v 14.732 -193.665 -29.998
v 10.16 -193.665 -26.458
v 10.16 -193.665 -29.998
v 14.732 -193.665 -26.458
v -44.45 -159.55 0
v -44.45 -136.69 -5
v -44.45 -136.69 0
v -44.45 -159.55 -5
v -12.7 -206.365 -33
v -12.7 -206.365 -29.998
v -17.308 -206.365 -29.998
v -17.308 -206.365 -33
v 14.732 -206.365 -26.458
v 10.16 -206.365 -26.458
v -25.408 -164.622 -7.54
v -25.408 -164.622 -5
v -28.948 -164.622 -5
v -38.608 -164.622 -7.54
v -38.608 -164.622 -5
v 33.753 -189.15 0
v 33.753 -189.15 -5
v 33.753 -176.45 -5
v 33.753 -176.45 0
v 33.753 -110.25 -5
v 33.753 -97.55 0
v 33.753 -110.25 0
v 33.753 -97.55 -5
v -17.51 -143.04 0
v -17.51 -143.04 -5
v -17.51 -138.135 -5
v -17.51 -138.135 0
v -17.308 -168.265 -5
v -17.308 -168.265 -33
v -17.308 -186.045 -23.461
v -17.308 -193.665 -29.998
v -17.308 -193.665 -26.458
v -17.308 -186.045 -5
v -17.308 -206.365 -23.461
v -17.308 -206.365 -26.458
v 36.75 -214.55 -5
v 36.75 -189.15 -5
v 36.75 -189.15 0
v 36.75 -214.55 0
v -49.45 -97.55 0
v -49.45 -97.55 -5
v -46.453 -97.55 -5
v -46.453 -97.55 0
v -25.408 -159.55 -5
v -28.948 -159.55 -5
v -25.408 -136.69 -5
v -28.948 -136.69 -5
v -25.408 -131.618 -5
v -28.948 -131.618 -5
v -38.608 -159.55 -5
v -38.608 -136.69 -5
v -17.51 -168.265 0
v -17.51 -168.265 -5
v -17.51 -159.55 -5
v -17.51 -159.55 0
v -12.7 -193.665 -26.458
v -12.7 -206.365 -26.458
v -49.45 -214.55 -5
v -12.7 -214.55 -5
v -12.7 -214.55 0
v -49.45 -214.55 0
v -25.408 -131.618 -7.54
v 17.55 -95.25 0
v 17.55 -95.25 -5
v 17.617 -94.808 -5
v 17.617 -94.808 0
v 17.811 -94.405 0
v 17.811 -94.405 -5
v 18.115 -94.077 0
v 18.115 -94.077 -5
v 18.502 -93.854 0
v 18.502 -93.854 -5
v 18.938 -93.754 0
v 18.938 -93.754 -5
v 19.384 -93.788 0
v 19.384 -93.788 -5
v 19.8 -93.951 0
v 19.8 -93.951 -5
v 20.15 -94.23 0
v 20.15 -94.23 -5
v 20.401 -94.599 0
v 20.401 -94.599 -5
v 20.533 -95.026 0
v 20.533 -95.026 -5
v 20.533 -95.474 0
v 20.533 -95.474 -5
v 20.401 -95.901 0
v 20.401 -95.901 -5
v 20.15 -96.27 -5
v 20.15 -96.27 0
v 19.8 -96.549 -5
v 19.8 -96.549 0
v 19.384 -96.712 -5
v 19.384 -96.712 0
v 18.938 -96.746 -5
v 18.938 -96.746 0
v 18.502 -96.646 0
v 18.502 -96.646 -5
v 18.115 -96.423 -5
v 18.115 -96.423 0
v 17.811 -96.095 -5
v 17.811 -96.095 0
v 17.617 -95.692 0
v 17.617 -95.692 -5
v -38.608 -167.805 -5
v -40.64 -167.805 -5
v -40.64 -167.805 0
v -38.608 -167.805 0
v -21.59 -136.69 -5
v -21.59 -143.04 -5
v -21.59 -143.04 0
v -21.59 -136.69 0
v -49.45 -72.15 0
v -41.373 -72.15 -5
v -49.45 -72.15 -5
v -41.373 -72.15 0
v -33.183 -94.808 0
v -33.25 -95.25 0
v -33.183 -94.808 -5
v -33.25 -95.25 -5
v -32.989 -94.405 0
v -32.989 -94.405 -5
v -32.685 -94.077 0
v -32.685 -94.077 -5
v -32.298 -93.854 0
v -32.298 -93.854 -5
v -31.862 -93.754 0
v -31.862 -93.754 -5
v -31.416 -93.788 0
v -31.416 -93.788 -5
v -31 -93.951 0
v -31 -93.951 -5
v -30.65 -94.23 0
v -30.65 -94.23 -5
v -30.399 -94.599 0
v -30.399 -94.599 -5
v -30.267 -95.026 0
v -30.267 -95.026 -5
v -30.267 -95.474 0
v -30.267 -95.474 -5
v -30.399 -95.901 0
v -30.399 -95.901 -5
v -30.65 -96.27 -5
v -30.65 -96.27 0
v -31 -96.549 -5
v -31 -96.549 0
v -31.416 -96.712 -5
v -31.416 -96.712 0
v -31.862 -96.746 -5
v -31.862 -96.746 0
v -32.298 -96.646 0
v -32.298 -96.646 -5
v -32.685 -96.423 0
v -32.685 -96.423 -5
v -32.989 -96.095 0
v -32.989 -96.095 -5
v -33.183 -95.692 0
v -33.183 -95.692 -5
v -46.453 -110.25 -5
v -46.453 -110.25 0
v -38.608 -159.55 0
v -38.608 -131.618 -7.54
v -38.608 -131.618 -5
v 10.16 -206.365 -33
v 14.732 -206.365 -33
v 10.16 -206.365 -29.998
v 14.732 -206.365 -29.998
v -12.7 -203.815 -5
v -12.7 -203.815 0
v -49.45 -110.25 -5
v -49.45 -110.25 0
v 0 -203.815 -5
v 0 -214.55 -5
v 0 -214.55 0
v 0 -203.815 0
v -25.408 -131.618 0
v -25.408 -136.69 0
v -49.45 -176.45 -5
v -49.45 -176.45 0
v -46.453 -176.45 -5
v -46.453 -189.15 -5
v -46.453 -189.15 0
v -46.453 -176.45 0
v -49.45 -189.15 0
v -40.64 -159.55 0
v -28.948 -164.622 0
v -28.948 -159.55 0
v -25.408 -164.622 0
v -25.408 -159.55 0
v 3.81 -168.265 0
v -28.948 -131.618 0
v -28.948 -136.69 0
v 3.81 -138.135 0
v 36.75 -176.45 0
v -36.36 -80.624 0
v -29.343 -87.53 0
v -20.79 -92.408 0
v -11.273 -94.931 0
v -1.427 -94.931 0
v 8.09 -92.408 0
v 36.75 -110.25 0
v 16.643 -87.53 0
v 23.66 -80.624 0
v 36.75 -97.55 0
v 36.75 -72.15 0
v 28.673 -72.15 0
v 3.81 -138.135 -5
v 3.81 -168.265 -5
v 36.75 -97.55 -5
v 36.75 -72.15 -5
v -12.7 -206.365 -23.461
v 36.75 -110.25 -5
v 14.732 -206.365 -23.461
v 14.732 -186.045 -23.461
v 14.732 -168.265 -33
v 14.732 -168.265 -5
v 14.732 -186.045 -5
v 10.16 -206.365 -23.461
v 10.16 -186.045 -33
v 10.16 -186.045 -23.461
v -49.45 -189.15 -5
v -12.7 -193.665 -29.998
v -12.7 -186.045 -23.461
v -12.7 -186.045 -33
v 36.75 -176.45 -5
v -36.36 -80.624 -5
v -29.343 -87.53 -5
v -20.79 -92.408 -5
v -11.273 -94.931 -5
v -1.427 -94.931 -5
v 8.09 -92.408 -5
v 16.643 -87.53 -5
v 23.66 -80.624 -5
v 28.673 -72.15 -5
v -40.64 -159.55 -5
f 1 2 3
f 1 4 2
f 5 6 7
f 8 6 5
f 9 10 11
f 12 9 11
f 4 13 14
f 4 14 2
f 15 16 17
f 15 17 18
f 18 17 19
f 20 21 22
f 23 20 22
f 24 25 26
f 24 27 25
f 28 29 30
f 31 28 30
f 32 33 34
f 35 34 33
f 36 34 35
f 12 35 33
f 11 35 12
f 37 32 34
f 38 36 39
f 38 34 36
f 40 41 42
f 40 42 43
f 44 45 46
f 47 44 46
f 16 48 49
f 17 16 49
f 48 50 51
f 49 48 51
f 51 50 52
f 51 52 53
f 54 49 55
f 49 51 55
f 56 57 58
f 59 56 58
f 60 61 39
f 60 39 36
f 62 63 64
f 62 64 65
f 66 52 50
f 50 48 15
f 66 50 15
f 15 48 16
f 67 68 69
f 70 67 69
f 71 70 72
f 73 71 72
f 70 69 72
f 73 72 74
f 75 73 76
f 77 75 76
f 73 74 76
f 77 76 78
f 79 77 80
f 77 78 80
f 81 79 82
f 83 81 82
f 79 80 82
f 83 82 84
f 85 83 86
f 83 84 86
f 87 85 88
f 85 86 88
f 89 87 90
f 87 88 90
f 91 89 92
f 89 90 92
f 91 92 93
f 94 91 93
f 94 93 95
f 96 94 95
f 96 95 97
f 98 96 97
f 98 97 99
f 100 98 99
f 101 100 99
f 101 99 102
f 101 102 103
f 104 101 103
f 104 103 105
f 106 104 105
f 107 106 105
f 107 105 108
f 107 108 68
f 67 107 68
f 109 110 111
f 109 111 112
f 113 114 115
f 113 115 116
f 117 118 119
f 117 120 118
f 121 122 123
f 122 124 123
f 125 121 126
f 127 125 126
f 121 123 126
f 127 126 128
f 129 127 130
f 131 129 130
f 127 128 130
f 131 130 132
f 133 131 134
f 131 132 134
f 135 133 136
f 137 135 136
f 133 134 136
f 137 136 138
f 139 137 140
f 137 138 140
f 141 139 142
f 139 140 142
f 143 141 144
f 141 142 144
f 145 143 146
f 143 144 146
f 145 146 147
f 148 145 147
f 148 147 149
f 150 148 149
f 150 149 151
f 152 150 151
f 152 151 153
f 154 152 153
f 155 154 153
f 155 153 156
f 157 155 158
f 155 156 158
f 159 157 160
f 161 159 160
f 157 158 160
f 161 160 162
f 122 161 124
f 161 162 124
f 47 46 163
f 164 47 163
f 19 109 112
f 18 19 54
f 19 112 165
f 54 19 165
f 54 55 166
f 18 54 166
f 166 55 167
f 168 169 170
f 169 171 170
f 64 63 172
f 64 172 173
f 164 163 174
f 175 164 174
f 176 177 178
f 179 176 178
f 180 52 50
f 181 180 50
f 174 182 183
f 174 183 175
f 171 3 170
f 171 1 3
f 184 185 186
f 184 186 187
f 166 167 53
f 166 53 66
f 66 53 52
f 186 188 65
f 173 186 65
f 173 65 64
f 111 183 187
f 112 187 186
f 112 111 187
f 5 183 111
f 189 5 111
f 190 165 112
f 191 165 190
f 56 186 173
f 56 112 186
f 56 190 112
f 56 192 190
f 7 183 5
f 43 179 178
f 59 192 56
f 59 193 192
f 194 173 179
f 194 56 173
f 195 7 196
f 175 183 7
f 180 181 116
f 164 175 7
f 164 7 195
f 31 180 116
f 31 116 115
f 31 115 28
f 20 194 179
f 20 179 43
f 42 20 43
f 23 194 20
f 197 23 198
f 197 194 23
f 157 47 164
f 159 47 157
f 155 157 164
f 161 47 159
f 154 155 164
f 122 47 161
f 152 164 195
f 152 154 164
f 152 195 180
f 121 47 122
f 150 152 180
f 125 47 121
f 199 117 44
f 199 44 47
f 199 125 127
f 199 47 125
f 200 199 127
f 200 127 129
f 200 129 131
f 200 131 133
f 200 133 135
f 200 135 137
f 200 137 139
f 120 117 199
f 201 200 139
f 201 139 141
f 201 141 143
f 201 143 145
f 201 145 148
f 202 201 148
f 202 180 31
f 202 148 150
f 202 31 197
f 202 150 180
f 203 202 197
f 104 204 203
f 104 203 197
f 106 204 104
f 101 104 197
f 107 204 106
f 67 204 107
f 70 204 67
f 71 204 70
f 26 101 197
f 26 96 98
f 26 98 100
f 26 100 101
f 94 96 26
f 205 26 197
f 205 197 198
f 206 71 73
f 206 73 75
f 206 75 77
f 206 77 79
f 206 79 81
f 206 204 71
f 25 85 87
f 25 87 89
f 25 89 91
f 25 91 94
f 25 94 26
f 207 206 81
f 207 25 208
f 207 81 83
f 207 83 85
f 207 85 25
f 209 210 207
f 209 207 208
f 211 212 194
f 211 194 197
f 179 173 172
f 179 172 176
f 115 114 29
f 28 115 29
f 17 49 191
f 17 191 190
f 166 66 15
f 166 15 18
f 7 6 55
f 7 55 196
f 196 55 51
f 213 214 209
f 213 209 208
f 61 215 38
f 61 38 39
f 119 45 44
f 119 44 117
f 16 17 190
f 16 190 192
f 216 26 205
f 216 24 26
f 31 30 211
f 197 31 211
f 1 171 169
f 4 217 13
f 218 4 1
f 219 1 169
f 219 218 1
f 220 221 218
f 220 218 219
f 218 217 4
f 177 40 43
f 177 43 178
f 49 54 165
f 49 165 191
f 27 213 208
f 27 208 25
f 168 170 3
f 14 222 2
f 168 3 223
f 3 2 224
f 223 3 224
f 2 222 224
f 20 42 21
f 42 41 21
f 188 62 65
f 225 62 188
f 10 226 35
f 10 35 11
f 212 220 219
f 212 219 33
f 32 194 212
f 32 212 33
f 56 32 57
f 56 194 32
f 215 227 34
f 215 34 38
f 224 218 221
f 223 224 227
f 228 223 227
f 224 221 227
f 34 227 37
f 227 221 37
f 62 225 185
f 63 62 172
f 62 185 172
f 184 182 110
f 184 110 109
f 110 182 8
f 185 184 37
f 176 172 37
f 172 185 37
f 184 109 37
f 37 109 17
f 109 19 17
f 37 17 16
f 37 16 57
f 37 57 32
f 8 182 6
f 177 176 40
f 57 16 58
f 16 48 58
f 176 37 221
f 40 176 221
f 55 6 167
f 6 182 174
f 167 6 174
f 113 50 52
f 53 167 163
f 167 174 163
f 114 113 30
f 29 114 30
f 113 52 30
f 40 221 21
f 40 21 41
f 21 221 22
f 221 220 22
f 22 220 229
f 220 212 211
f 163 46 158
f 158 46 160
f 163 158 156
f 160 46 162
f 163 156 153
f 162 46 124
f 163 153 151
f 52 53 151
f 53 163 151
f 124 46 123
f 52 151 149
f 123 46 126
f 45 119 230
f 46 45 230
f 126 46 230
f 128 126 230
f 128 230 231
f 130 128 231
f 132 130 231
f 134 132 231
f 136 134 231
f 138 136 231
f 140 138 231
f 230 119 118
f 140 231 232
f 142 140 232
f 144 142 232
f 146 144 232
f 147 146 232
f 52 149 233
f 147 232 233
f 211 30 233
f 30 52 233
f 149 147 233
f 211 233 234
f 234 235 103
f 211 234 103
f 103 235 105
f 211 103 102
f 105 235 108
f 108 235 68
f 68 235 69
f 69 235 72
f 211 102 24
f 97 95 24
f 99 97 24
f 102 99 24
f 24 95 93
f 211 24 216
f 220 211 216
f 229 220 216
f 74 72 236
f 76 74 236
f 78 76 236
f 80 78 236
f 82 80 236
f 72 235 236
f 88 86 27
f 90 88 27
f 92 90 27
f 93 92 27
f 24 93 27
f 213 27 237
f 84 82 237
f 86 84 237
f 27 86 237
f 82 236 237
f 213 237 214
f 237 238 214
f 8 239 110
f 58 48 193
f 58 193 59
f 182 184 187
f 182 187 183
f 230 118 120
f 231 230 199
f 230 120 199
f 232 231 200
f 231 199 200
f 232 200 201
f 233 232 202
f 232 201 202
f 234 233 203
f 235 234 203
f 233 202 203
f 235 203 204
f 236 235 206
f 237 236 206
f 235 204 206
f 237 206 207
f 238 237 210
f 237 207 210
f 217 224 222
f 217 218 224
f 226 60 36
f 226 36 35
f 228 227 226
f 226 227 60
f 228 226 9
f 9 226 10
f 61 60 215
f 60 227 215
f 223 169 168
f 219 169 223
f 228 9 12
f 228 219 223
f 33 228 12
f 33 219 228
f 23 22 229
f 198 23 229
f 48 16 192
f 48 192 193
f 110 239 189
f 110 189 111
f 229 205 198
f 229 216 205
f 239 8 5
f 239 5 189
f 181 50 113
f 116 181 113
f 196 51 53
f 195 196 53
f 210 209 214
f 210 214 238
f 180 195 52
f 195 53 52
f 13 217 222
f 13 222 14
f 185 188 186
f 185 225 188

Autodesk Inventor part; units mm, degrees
ref_plane "YZ Plane" through (0, 0, 0) normal (1, 0, 0) x (0, 1, 0)
ref_plane "XZ Plane" through (0, 0, 0) normal (0, 1, 0) x (-1, 0, 0)
ref_plane "XY Plane" through (0, 0, 0) normal (0, 0, 1) x (1, 0, 0)
sketch "Sketch1" plane through (0, 0, 0) normal (0, 0, 1) x (1, 0, 0)
  line L0 (31.75, -57.15) -> (31.75, 82.55)
  line L1 (31.75, 82.55) -> (-44.45, 82.55)
  line L2 (-44.45, 82.55) -> (-44.45, -57.15)
  arc A0 (-44.45, -57.15) -> (31.75, -57.15) centre (-6.35, -57.15) ccw
  line L3 (31.75, -57.15) -> (31.75, -209.55)
  line L4 (31.75, -209.55) -> (-44.45, -209.55)
  line L5 (-44.45, -209.55) -> (-44.45, -57.15)
  line L6 (31.75, -57.15) -> (-44.45, -57.15)
  circle A1 centre (-6.35, -57.15) radius 38.1
  point P0 (0, 0)
  dimension "d0" = 152.4
  dimension "d6" = 76.2
extrude "Extrusion1" add sketch "Sketch1" against normal blind 5 contours L3 L4 L5 A0
sketch "Sketch2" plane through (0, 0, 0) normal (0, 0, 1) x (1, 0, 0)
  arc A0 (-44.45, -57.15) -> (31.75, -57.15) centre (-6.35, -57.15) ccw projected
  line L0 (31.75, -57.15) -> (31.75, -209.55) projected
  line L1 (-44.45, -57.15) -> (31.75, -57.15)
  line L2 (31.75, -57.15) -> (31.75, -72.15)
  line L3 (31.75, -72.15) -> (-44.45, -72.15)
  line L4 (-44.45, -72.15) -> (-44.45, -57.15)
  point P0 (0, 0)
  dimension "d3" = 15
extrude "Extrusion2" cut sketch "Sketch2" against normal blind 5 contours L1 A0 L3 | A0 L3 L4 | L0 L3 A0
sketch "Sketch3" plane through (0, 0, -5) normal (0, 0, -1) x (-1, 0, 0)
  line L0 (16.51, -146.85) -> (16.51, -159.55) projected
  line L1 (-3.81, -159.55) -> (-3.81, -146.85) projected
  line L2 (16.51, -159.55) -> (16.51, -161.55)
  line L3 (-3.81, -146.85) -> (-3.81, -144.85)
  line L4 (4.857, -150.5555) -> (16.51, -161.55)
  line L5 (8.3369, -156.3105) -> (-3.81, -144.85)
  line L6 (16.51, -141.135) -> (12.446, -141.135)
  line L7 (16.51, -165.265) -> (12.446, -165.265)
  line L8 (16.51, -141.135) -> (17.51, -141.135)
  line L9 (17.51, -141.135) -> (17.51, -138.135)
  line L10 (17.51, -138.135) -> (-3.81, -138.135)
  line L11 (-3.81, -138.135) -> (-3.81, -163.265)
  line L12 (-3.81, -163.265) -> (-3.81, -164.265)
  line L13 (17.51, -138.135) -> (17.51, -165.265)
  line L14 (17.51, -165.265) -> (17.51, -168.265)
  line L15 (17.51, -168.265) -> (-3.81, -168.265)
  line L16 (-3.81, -168.265) -> (-3.81, -164.265)
  point P0 (0, 0)
  point P1 (17.51, -164.265)
  dimension "d7" = 2
  dimension "d8" = 2
  dimension "d28" = 1
  dimension "d29" = 3
  dimension "d30" = 1
  dimension "d73" = 3
extrude "Extrusion3" cut sketch "Sketch3" against normal blind 5
sketch "Sketch4" plane through (0, 0, -5) normal (0, 0, -1) x (-1, 0, 0)
  line L0 (-31.75, -72.15) -> (-28.673, -72.15) projected
  line L1 (-31.75, -72.15) -> (-36.75, -72.15)
  line L2 (-36.75, -72.15) -> (-36.75, -209.55)
  line L3 (-36.75, -209.55) -> (-36.75, -214.55)
  line L4 (-36.75, -214.55) -> (44.45, -214.55)
  line L5 (44.45, -214.55) -> (49.45, -214.55)
  line L6 (49.45, -214.55) -> (49.45, -72.15)
  line L7 (49.45, -72.15) -> (44.45, -72.15)
  line L8 (44.45, -72.15) -> (44.45, -214.55)
  line L9 (44.45, -214.55) -> (49.45, -214.55)
  line L10 (49.45, -214.55) -> (49.45, -72.15)
  line L11 (49.45, -214.55) -> (-36.75, -214.55)
  line L12 (-36.75, -214.55) -> (-36.75, -209.55)
  line L13 (-36.75, -209.55) -> (49.45, -209.55)
  line L14 (49.45, -209.55) -> (49.45, -214.55)
  line L15 (-36.75, -214.55) -> (-31.75, -214.55)
  line L16 (-31.75, -214.55) -> (-31.75, -72.15)
  line L17 (-31.75, -72.15) -> (-36.75, -72.15)
  line L18 (-36.75, -72.15) -> (-36.75, -214.55)
  point P0 (0, 0)
  dimension "d11" = 5
  dimension "d12" = 5
  dimension "d13" = 5
extrude "Extrusion4" add sketch "Sketch4" against normal blind 5
sketch "Sketch6" plane through (-49.45, -214.55, 0) normal (0, -1, 0) x (1, 0, 0)
  line L0 (32.94, 0) -> (53.26, 0) projected
  line L1 (43.1, 0) -> (36.75, 0)
  line L2 (36.75, 0) -> (49.45, 0)
  line L3 (86.2, -5) -> (0, -5) projected
  line L4 (49.45, 0) -> (36.75, 0)
  line L5 (36.75, 0) -> (36.75, -5)
  line L6 (36.75, -5) -> (49.45, -5)
  line L7 (49.45, -5) -> (49.45, 0)
  point P0 (64.1616, -5)
  dimension "d18" = 6.35
  dimension "d19" = 12.7
extrude "Extrusion6" add sketch "Sketch6" along normal blind 10.16
sketch "Sketch7" plane through (0, 0, -5) normal (0, 0, -1) x (-1, 0, 0)
  line L0 (12.7, -224.71) -> (0, -224.71) projected
  line L1 (6.35, -224.71) -> (6.35, -220.9)
  circle A0 centre (6.35, -220.9) radius 1.75
  point P0 (0, 0)
  dimension "d26" = 3.81
  dimension "d27" = 3.5
extrude "Extrusion7" cut sketch "Sketch7" against normal blind 6.35
sketch "Sketch8" plane through (0, 0, -5) normal (0, 0, -1) x (-1, 0, 0)
  line L0 (44.45, -136.69) -> (28.448, -136.69) projected
  line L1 (44.45, -158.28) -> (44.45, -137.96) projected
  line L2 (44.45, -136.69) -> (44.45, -137.96) projected
  line L3 (44.45, -158.28) -> (44.45, -159.55) projected
  line L4 (44.45, -159.55) -> (28.448, -159.55) projected
  line L5 (39.116, -159.55) -> (40.132, -159.55) projected
  line L6 (39.116, -159.55) -> (39.116, -162.09) projected
  line L7 (40.132, -162.09) -> (39.116, -162.09) projected
  line L8 (40.132, -159.55) -> (40.132, -162.09) projected
  line L9 (25.908, -137.96) -> (21.59, -137.96) projected
  line L10 (21.59, -153.2) -> (21.59, -137.96) projected
  line L11 (21.59, -158.28) -> (21.59, -153.2) projected
  line L12 (25.908, -158.28) -> (21.59, -158.28) projected
  line L13 (25.908, -158.28) -> (25.908, -164.122) projected
  line L14 (25.908, -164.122) -> (28.448, -164.122) projected
  line L15 (28.448, -158.28) -> (28.448, -164.122) projected
  line L16 (44.45, -158.28) -> (28.448, -158.28) projected
  line L17 (44.45, -158.28) -> (44.45, -137.96) projected
  line L18 (44.45, -137.96) -> (28.448, -137.96) projected
  line L19 (28.448, -132.118) -> (28.448, -137.96) projected
  line L20 (25.908, -132.118) -> (28.448, -132.118) projected
  line L21 (25.908, -132.118) -> (25.908, -137.96) projected
  line L22 (25.908, -136.69) -> (21.59, -136.69) projected
  line L23 (21.59, -136.69) -> (21.59, -137.96) projected
  line L24 (25.908, -159.55) -> (21.59, -159.55) projected
  line L25 (21.59, -159.55) -> (16.51, -159.55)
  line L26 (21.59, -146.85) -> (16.51, -146.85)
  line L27 (17.51, -140.135) -> (17.51, -166.265) projected
  line L28 (44.45, -159.55) -> (21.59, -159.55)
  line L29 (21.59, -159.55) -> (21.59, -136.69)
  line L30 (21.59, -136.69) -> (44.45, -136.69)
  line L31 (44.45, -136.69) -> (44.45, -159.55)
  line L32 (28.448, -132.118) -> (25.908, -132.118)
  line L33 (25.908, -132.118) -> (25.908, -136.69)
  line L34 (25.908, -136.69) -> (28.448, -136.69)
  line L35 (28.448, -136.69) -> (28.448, -132.118)
  line L36 (25.908, -159.55) -> (28.448, -159.55)
  line L37 (28.448, -159.55) -> (28.448, -164.122)
  line L38 (28.448, -164.122) -> (25.908, -164.122)
  line L39 (25.908, -164.122) -> (25.908, -159.55)
  line L40 (40.132, -162.09) -> (39.116, -162.09)
  line L41 (39.116, -162.09) -> (39.116, -159.55)
  line L42 (39.116, -159.55) -> (40.132, -159.55)
  line L43 (40.132, -159.55) -> (40.132, -162.09)
  line L44 (16.51, -146.85) -> (21.59, -146.85)
  line L45 (21.59, -146.85) -> (21.59, -159.55)
  line L46 (21.59, -159.55) -> (16.51, -159.55)
  line L47 (16.51, -159.55) -> (16.51, -146.85)
  line L48 (40.132, -159.55) -> (40.64, -159.55)
  line L49 (40.64, -159.55) -> (40.64, -167.805)
  line L50 (40.64, -167.805) -> (39.116, -167.805)
  line L51 (39.116, -167.805) -> (38.608, -167.805)
  line L52 (38.608, -167.805) -> (38.608, -159.55)
  line L53 (40.64, -167.805) -> (38.608, -167.805)
  line L54 (38.608, -167.805) -> (38.608, -159.55)
  line L55 (38.608, -159.55) -> (40.64, -159.55)
  line L56 (40.64, -159.55) -> (40.64, -167.805)
  line L57 (28.448, -136.69) -> (28.948, -136.69)
  line L58 (28.948, -136.69) -> (28.948, -132.118)
  line L59 (28.948, -132.118) -> (28.948, -131.618)
  line L60 (28.948, -131.618) -> (25.908, -131.618)
  line L61 (25.908, -131.618) -> (25.408, -131.618)
  line L62 (25.408, -131.618) -> (25.408, -136.69)
  line L63 (44.45, -148.12) -> (42.0007, -148.12)
  line L64 (28.448, -164.122) -> (28.448, -158.28)
  line L65 (25.908, -164.122) -> (28.448, -164.122)
  line L66 (25.908, -164.122) -> (25.908, -158.28)
  line L67 (28.448, -164.122) -> (25.908, -164.122)
  line L68 (25.908, -164.122) -> (25.908, -159.55)
  line L69 (28.448, -159.55) -> (28.448, -164.122)
  line L70 (28.948, -159.55) -> (28.948, -164.122)
  line L71 (28.948, -164.122) -> (28.948, -164.622)
  line L72 (28.948, -164.622) -> (25.908, -164.622)
  line L73 (25.908, -164.622) -> (25.408, -164.622)
  line L74 (25.408, -164.622) -> (25.408, -159.55)
  line L75 (28.948, -159.55) -> (25.408, -159.55)
  line L76 (25.408, -159.55) -> (25.408, -164.622)
  line L77 (25.408, -164.622) -> (28.948, -164.622)
  line L78 (28.948, -164.622) -> (28.948, -159.55)
  point P0 (0, 0)
  dimension "d33" = 0.508
  dimension "d34" = 8.255
  dimension "d35" = 0.508
  dimension "d45" = 0.5
  dimension "d46" = 0.5
  dimension "d47" = 0.5
extrude "Extrusion8" cut sketch "Sketch8" against normal blind 25.4
ref_plane "Work Plane1" through (-5.588, -193.539, -26.4481) normal (1, 0, 0) x (0, 0, 1)
sketch "Sketch18" plane through (0, 0, -5) normal (0, 0, -1) x (-1, 0, 0)
  line L0 (-36.75, -72.15) -> (-28.673, -72.15) projected
  line L1 (-36.75, -72.15) -> (-36.75, -97.55)
  line L2 (-36.75, -214.55) -> (-36.75, -72.15) projected
  line L3 (-36.75, -97.55) -> (-33.7528, -97.55)
  line L4 (-33.7528, -97.55) -> (-33.7528, -110.25)
  line L5 (-33.7528, -110.25) -> (-36.75, -110.25)
  line L6 (-36.75, -110.25) -> (-36.75, -97.55)
  line L7 (-36.75, -214.55) -> (-36.75, -189.15)
  line L8 (-36.75, -189.15) -> (-33.7528, -189.15)
  line L9 (-33.7528, -189.15) -> (-33.7528, -176.45)
  line L10 (-33.7528, -176.45) -> (-36.75, -176.45)
  line L11 (-36.75, -176.45) -> (-36.75, -189.15)
  line L12 (0, -224.71) -> (12.7, -224.71) projected
  line L13 (6.35, -224.71) -> (6.35, -239.7955)
  line L14 (49.45, -72.15) -> (41.373, -72.15)
  line L15 (49.45, -72.15) -> (49.45, -97.55)
  line L16 (49.45, -214.55) -> (49.45, -72.15)
  line L17 (49.45, -97.55) -> (46.4528, -97.55)
  line L18 (46.4528, -97.55) -> (46.4528, -110.25)
  line L19 (46.4528, -110.25) -> (49.45, -110.25)
  line L20 (49.45, -110.25) -> (49.45, -97.55)
  line L21 (49.45, -214.55) -> (49.45, -189.15)
  line L22 (49.45, -189.15) -> (46.4528, -189.15)
  line L23 (46.4528, -189.15) -> (46.4528, -176.45)
  line L24 (46.4528, -176.45) -> (49.45, -176.45)
  line L25 (49.45, -176.45) -> (49.45, -189.15)
  point P0 (0, 0)
  dimension "d83" = 25.4
  dimension "d84" = 12.7
  dimension "d85" = 2.9972
  dimension "d86" = 25.4
  dimension "d87" = 12.7
  dimension "d88" = 2.9972
extrude "Extrusion18" cut sketch "Sketch18" against normal blind 10
sketch "Sketch20" plane through (-49.45, -224.71, 0) normal (0, -1, 0) x (1, 0, 0)
  line L0 (36.75, -5) -> (36.75, 0) projected
  line L1 (36.75, -5) -> (49.45, -5)
  line L2 (49.45, -5) -> (49.45, 0)
  line L3 (49.45, 0) -> (36.75, 0)
  line L4 (36.75, 0) -> (36.75, -5)
extrude "Extrusion19" cut sketch "Sketch20" against normal blind 20.8946
sketch "Sketch22" plane through (0, 0, -5) normal (0, 0, -1) x (-1, 0, 0)
  line L0 (25.408, -159.55) -> (25.408, -164.622) projected
  line L1 (25.408, -164.622) -> (38.608, -164.622)
  line L2 (38.608, -164.622) -> (38.608, -131.618)
  line L3 (38.608, -131.618) -> (25.408, -131.618)
  line L4 (25.408, -131.618) -> (25.408, -164.622)
  point P0 (0, 0)
extrude "Extrusion21" add sketch "Sketch22" along normal blind 2.54
ref_plane "Work Plane2" through (14.732, -52.9, -29.002) normal (1, 0, 0) x (0, 0, -1)
sketch "Sketch24" plane through (14.732, -52.9, -29.002) normal (1, 0, 0) x (0, 0, -1)
  line L0 (0, -25.4) -> (0, -38.1) construction
  line L1 (0, -38.1) -> (3, -38.1) construction
  line L2 (3, 0) -> (3, -38.1) projected
  line L3 (-24.002, 0) -> (3, 0) construction
  line L4 (-24.002, -17.78) -> (-24.002, 0) construction
  line L5 (-5.54, -17.78) -> (-24.002, -17.78) construction
  line L6 (-5.54, -38.1) -> (-5.54, -17.78) construction
  line L7 (-2.54, -38.1) -> (-5.54, -38.1) construction
  line L8 (-2.54, -38.1) -> (-2.54, -25.4) construction
  line L9 (-2.54, -25.4) -> (0, -25.4) construction
  line L10 (-24.002, -115.365) -> (-29.002, -115.365) projected
  line L11 (-24.002, -115.365) -> (-24.002, -133.145)
  line L12 (-24.002, -115.365) -> (2.9982, -115.365)
  line L13 (2.9982, -115.365) -> (2.9982, -153.465)
  line L14 (-24.002, -133.145) -> (-5.5413, -133.145)
  line L15 (-5.5413, -133.145) -> (-5.5413, -153.465)
  line L16 (-5.5413, -153.465) -> (-2.5441, -153.465)
  line L17 (-2.5441, -153.465) -> (-2.5441, -140.765)
  line L18 (-2.5441, -140.765) -> (-0.0041, -140.765)
  line L19 (-0.0041, -140.765) -> (-0.0041, -153.465)
  line L20 (-0.0041, -153.465) -> (2.9982, -153.465)
  point P0 (-29.002, 52.9)
  dimension "d102" = 17.78
  dimension "d103" = 27.0002
  dimension "d104" = 38.1
  dimension "d106" = 18.4607
  dimension "d107" = 20.32
  dimension "d108" = 2.9972
  dimension "d109" = 12.7
  dimension "d110" = 2.54
extrude "Extrusion23" add sketch "Sketch24" against normal blind 32.04
sketch "Sketch25" plane through (14.732, -206.365, -32.0002) normal (0, 0, -1) x (-1, 0, 0)
  line L0 (27.432, 135.685) -> (27.432, 115.365) projected
  line L1 (4.572, 115.365) -> (4.572, 135.685) projected
  line L2 (27.432, 115.365) -> (32.004, 115.365) projected
  line L3 (0, 0) -> (32.04, 0) projected
  line L4 (32.04, 0) -> (27.468, 0)
  line L5 (0, 0) -> (4.572, 0)
  line L6 (4.572, 0) -> (27.432, 0)
  line L7 (27.432, 0) -> (27.432, 20.32)
  line L8 (27.432, 20.32) -> (4.572, 20.32)
  line L9 (4.572, 20.32) -> (4.572, 0)
  point P0 (14.732, 206.365)
  dimension "d113" = 4.572
  dimension "d114" = 4.572
  dimension "d115" = 20.32
extrude "Extrusion24" cut sketch "Sketch25" against normal blind 10
sketch "Sketch26" plane through (0, 0, -5) normal (0, 0, -1) x (-1, 0, 0)
  circle A0 centre (-19.05, -95.25) radius 2 projected
  circle A1 centre (31.75, -95.25) radius 2 projected
  circle A2 centre (31.75, -95.25) radius 1.5
  circle A3 centre (-19.05, -95.25) radius 1.5
  point P0 (0, 0)
  dimension "d118" = 3
  dimension "d119" = 3
extrude "Extrusion25" cut sketch "Sketch26" against normal blind 10 contours A2 | A3
sketch "Sketch27" plane through (14.732, -206.365, -32.0002) normal (0, 0, -1) x (-1, 0, 0)
  line L0 (4.572, 0) -> (4.572, 20.32) projected
  line L1 (4.572, 20.32) -> (27.432, 20.32) projected
  line L2 (27.432, 20.32) -> (27.432, 0) projected
  line L3 (27.432, 0) -> (32.04, 0) projected
  line L4 (32.04, 38.1) -> (32.04, 0) projected
  line L5 (0, 38.1) -> (32.04, 38.1) projected
  line L6 (0, 0) -> (0, 38.1) projected
  line L7 (0, 0) -> (4.572, 0) projected
  point P0 (14.732, 206.365)
extrude "Extrusion26" add sketch "Sketch27" along normal blind 1
sketch "Sketch28" plane through (14.732, -52.9, -29.002) normal (1, 0, 0) x (0, 0, -1)
  line L0 (-2.5441, -140.765) -> (-0.0041, -140.765) projected
  line L1 (-0.0041, -153.465) -> (3.9982, -153.465) projected
  line L2 (-0.0041, -140.765) -> (0.9959, -140.765)
  line L3 (0.9959, -140.765) -> (0.9959, -153.465)
  line L4 (0.9959, -153.465) -> (-0.0041, -153.465)
  line L5 (-0.0041, -153.465) -> (-0.0041, -140.765)
  point P0 (-29.002, 52.9)
  dimension "d124" = 1
extrude "Extrusion27" cut sketch "Sketch28" against normal blind 3098.8
sketch "Sketch29" plane through (0, 0, -5) normal (0, 0, -1) x (-1, 0, 0)
  line L0 (21.59, -146.85) -> (17.51, -146.85) projected
  line L1 (21.59, -146.85) -> (21.59, -143.04)
  line L2 (21.59, -136.69) -> (21.59, -146.85) projected
  line L3 (21.59, -143.04) -> (17.51, -143.04)
  line L4 (17.51, -143.04) -> (17.51, -146.85)
  line L5 (17.51, -146.85) -> (21.59, -146.85)
  point P0 (0, 0)
  dimension "d127" = 3.81
extrude "Extrusion28" cut sketch "Sketch29" against normal blind 3098.8
properties part number "Backhalf"
